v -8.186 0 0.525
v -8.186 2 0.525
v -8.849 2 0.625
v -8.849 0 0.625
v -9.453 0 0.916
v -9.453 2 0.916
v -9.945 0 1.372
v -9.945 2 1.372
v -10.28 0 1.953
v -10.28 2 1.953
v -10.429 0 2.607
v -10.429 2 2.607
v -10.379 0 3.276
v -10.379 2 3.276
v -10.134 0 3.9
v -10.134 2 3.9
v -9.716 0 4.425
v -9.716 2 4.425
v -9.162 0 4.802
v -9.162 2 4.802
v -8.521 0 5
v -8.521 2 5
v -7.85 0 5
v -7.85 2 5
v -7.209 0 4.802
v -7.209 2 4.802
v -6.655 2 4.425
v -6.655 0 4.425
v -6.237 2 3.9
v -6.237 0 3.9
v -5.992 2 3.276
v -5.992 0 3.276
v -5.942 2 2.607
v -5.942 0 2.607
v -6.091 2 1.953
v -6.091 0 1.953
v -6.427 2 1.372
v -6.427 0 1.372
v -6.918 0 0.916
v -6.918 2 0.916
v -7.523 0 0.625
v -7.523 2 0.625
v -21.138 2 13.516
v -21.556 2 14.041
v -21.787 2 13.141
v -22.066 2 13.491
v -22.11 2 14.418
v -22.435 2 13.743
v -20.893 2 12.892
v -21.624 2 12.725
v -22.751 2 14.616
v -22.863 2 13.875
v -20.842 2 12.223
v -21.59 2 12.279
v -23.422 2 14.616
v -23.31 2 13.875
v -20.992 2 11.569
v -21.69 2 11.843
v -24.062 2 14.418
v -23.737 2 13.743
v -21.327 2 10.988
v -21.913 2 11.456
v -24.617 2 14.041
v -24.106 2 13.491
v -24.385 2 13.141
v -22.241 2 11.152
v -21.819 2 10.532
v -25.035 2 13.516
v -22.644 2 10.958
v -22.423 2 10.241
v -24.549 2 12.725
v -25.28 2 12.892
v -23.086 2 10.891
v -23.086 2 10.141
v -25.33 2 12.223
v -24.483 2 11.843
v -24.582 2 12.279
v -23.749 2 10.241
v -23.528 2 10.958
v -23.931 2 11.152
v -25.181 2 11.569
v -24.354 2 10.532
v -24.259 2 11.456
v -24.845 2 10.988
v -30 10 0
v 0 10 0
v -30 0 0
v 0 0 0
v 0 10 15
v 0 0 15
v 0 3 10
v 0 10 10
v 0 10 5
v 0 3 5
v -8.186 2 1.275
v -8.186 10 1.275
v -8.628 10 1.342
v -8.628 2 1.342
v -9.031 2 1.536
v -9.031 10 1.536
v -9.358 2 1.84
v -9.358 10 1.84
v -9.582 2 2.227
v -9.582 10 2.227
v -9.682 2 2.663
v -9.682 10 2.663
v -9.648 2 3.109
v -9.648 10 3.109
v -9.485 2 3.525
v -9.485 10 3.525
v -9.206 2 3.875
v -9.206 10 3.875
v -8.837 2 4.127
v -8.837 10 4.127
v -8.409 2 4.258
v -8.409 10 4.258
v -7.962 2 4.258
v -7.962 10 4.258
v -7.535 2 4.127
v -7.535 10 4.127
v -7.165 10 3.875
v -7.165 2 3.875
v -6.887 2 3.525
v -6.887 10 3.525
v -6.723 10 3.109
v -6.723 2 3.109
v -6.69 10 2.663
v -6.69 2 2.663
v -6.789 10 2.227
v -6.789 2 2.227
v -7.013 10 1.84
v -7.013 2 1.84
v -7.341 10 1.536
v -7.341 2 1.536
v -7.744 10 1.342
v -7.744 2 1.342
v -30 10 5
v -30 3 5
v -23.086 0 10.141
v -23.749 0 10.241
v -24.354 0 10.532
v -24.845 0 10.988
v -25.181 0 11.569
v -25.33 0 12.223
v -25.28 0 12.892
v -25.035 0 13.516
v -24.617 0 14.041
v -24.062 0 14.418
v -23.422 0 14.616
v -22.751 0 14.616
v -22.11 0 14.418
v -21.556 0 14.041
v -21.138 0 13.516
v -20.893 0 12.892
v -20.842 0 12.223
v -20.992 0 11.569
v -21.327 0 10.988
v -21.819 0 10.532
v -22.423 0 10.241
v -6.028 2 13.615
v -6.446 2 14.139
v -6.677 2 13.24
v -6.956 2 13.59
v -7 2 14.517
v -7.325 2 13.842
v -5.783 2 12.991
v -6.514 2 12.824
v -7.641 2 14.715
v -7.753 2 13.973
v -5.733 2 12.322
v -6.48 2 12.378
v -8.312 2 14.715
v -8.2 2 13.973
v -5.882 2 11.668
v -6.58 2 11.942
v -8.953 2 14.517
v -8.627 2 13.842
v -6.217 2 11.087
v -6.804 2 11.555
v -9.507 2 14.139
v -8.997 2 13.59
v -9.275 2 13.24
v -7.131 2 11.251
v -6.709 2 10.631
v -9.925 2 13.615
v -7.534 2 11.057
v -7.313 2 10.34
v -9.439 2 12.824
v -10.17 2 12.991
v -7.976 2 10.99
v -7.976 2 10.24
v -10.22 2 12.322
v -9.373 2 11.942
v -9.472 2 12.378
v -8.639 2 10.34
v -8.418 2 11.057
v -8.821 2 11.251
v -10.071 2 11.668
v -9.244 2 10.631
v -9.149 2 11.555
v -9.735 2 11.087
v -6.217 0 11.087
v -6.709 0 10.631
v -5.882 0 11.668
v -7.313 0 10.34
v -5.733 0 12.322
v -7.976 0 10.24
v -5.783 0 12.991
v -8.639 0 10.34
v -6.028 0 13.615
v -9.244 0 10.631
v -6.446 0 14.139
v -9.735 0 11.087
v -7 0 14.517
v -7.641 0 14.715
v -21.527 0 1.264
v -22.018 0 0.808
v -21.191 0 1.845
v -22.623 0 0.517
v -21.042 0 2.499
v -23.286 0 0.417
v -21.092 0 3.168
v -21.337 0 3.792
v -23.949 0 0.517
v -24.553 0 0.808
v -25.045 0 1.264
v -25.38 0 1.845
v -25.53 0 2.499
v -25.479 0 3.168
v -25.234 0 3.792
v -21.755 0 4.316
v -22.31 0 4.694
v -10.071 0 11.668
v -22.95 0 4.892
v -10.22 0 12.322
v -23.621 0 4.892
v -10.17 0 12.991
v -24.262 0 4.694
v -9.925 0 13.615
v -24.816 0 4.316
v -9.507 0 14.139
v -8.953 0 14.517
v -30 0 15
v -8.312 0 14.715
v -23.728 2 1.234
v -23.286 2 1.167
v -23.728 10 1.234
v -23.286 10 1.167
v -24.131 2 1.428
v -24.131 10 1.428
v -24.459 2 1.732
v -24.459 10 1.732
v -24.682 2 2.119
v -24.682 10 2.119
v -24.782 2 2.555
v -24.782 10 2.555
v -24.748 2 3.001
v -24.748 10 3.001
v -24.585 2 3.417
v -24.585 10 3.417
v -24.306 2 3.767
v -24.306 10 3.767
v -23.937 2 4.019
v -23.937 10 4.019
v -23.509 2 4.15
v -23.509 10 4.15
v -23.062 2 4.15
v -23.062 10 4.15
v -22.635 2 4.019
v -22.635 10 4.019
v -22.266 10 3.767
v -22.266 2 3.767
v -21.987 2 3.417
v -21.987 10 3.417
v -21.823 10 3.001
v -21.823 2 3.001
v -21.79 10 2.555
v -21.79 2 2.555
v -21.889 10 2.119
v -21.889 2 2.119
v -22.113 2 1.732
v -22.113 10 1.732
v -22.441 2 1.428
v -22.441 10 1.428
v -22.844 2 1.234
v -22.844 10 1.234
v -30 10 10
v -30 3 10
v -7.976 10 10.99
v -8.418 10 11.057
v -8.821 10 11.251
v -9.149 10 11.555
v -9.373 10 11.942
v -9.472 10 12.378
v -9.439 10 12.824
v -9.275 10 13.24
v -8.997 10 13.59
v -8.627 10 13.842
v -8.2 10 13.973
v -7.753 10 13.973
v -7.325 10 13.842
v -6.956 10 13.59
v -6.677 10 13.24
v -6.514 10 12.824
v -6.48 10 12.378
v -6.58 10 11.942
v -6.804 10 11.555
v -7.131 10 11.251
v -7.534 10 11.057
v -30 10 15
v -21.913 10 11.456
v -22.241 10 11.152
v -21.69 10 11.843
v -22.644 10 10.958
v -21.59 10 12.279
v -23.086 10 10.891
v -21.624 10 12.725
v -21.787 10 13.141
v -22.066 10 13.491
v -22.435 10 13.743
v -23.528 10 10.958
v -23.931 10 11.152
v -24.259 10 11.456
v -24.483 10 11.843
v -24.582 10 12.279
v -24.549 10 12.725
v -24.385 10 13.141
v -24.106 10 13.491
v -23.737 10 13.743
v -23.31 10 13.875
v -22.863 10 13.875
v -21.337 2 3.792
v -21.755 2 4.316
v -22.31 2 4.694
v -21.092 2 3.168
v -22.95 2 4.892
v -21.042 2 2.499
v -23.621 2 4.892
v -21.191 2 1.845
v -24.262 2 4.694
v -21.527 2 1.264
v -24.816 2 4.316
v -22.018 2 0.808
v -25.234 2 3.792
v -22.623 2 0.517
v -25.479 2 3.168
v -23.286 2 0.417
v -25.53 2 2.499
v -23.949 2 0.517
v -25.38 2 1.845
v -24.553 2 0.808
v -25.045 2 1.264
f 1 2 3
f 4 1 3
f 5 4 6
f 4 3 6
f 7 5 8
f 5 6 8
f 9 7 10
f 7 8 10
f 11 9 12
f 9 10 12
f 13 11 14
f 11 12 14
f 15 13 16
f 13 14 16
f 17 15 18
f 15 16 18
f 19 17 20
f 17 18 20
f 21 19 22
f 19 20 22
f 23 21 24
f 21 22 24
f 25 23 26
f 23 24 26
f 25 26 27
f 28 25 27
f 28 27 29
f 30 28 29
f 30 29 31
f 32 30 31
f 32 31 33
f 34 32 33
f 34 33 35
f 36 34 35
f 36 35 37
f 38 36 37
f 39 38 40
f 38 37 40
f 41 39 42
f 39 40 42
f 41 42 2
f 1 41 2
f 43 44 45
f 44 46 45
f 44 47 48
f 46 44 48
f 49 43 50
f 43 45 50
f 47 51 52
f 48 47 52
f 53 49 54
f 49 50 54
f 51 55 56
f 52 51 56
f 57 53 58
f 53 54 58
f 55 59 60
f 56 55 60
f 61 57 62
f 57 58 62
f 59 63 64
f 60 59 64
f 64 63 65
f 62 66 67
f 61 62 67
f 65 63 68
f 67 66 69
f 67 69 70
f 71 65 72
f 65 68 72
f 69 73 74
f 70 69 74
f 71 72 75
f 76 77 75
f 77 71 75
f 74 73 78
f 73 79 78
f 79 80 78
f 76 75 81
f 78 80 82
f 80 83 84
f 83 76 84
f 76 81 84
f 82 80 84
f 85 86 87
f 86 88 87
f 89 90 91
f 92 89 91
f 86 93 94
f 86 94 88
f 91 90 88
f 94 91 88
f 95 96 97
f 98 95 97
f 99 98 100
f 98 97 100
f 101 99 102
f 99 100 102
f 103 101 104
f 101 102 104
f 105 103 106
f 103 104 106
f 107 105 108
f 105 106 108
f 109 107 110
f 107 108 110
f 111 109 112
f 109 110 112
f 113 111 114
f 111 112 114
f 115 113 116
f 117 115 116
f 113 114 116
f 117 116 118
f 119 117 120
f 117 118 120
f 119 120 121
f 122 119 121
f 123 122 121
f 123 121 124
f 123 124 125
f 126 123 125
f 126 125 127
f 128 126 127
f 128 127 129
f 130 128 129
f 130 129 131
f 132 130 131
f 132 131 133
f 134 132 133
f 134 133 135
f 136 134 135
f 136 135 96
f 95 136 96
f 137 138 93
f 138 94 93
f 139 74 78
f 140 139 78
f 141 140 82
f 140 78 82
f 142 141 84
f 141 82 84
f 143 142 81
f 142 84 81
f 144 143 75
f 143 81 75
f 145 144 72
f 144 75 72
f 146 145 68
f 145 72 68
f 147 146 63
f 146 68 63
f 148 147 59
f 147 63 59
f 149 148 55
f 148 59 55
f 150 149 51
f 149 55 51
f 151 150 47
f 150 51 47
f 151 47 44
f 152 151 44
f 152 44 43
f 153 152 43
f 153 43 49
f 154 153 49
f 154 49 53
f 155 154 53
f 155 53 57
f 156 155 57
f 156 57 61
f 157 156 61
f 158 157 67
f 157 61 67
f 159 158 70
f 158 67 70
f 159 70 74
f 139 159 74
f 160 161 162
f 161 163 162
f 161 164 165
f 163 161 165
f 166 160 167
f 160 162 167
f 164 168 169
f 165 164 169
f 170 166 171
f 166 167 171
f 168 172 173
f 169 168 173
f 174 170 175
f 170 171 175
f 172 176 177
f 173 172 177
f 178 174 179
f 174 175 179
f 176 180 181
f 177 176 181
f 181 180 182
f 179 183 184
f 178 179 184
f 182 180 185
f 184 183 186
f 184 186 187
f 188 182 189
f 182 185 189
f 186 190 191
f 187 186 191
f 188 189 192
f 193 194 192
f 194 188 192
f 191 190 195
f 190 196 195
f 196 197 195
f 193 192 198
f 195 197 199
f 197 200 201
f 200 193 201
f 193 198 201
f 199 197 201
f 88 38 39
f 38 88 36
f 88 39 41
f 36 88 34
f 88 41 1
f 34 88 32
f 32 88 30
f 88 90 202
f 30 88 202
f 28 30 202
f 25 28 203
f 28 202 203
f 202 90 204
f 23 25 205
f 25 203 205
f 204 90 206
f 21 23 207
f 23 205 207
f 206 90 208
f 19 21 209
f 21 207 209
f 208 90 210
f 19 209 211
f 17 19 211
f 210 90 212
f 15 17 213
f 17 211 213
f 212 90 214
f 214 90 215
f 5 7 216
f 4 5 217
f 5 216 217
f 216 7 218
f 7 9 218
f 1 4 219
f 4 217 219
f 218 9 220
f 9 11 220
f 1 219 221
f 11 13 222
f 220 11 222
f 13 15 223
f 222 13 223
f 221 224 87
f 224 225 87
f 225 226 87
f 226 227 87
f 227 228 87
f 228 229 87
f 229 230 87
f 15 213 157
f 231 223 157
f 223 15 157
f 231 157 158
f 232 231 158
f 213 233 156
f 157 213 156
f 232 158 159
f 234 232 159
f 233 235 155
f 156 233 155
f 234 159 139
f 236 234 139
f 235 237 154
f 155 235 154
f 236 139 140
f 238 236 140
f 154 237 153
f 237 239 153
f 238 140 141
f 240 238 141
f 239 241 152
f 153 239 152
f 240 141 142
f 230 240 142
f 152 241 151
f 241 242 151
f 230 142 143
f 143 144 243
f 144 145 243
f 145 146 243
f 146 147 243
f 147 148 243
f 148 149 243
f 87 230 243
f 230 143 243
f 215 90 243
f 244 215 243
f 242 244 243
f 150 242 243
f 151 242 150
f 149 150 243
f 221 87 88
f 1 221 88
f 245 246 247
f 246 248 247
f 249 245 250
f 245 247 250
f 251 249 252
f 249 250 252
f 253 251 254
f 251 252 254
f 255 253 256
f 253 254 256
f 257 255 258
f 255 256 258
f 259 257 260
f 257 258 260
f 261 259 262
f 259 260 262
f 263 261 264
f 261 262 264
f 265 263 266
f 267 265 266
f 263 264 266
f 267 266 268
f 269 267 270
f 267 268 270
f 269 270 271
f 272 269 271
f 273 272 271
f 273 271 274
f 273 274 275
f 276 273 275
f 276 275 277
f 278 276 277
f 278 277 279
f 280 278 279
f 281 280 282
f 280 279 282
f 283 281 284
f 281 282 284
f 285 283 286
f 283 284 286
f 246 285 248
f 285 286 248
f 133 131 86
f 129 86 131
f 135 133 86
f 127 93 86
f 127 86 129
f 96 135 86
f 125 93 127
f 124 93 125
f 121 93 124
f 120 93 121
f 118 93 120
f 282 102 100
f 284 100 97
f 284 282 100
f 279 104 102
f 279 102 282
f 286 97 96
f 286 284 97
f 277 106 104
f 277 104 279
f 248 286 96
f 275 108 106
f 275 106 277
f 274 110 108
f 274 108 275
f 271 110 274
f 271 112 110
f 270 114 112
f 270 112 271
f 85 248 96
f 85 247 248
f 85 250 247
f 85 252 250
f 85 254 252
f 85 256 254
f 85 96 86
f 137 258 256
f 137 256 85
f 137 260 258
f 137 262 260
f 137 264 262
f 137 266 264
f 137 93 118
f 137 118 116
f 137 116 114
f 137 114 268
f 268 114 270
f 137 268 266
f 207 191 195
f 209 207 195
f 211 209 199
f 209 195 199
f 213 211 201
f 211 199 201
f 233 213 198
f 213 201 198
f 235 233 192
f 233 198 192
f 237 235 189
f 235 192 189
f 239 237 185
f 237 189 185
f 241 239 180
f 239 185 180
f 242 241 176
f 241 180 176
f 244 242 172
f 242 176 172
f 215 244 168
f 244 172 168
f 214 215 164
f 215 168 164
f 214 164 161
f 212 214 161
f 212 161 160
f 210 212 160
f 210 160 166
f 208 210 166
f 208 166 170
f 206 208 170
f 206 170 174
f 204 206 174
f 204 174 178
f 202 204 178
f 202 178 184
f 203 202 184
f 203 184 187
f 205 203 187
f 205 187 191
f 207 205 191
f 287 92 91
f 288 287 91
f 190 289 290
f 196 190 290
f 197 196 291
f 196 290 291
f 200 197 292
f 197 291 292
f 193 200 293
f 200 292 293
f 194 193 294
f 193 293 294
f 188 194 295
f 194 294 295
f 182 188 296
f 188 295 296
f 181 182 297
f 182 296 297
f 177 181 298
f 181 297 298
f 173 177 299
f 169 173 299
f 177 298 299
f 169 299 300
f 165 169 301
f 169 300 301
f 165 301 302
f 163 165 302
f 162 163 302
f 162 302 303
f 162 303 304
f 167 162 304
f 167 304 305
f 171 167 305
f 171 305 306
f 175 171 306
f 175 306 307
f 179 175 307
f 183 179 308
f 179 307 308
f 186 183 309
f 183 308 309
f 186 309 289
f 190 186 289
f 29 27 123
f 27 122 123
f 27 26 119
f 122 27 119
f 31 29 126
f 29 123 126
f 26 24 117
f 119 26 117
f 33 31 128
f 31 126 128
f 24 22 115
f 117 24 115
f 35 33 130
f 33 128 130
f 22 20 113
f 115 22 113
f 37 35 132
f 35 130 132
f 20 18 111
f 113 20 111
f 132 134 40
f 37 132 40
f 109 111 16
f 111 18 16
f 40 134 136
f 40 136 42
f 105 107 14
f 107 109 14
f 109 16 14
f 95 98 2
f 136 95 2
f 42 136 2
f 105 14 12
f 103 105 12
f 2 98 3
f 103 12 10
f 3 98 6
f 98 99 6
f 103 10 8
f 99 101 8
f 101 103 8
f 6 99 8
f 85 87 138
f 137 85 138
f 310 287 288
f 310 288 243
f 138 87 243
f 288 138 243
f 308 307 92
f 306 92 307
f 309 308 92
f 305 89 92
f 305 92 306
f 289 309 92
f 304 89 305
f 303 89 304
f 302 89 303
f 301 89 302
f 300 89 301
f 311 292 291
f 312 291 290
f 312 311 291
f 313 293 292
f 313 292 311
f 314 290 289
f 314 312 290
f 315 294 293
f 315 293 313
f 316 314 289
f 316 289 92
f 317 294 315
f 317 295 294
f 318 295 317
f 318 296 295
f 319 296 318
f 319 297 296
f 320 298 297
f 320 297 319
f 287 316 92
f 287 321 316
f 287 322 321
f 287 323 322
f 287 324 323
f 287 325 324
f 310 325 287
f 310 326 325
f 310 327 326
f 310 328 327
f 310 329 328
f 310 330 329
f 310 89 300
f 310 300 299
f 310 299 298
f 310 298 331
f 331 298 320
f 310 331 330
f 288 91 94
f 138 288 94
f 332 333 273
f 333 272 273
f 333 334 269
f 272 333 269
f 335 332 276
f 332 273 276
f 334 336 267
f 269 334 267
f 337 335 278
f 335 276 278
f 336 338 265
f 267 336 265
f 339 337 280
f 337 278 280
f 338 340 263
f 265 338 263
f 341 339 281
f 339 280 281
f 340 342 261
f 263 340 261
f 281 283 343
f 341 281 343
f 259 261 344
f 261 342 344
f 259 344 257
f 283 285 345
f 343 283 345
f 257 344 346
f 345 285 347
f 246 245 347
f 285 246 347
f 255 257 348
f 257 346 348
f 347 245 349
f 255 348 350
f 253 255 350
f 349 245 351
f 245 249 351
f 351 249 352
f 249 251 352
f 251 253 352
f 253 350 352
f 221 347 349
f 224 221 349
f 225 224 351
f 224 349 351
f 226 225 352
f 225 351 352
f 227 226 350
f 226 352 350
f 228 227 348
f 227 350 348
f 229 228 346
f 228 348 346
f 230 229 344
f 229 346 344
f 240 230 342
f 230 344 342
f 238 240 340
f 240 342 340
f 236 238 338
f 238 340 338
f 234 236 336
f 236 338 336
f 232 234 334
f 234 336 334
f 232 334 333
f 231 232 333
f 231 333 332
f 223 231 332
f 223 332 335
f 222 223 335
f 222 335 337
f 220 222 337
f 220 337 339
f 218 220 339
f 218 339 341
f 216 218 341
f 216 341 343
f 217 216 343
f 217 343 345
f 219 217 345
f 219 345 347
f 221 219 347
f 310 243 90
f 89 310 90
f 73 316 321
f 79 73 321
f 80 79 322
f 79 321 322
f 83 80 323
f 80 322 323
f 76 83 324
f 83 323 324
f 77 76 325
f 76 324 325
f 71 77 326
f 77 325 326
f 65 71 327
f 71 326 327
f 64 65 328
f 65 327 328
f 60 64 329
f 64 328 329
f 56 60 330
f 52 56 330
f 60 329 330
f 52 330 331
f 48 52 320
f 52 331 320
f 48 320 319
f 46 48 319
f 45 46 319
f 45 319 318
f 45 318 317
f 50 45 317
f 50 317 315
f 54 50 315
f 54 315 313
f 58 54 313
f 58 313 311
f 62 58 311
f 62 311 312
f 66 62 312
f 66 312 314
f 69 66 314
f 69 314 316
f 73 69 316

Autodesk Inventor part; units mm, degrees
ref_plane "YZ Plane" through (0, 0, 0) normal (1, 0, 0) x (0, 1, 0)
ref_plane "XZ Plane" through (0, 0, 0) normal (0, 1, 0) x (-1, 0, 0)
ref_plane "XY Plane" through (0, 0, 0) normal (0, 0, 1) x (1, 0, 0)
sketch "スケッチ1" plane through (0, 0, 0) normal (0, 1, 0) x (-1, 0, 0)
  line L0 (0, 0) -> (30, 0)
  line L1 (30, 0) -> (30, 15)
  line L2 (30, 15) -> (0, 15)
  line L3 (0, 15) -> (0, 0)
  dimension "d0" = 30
  dimension "d1" = 15
extrude "押し出し1" add sketch "スケッチ1" along normal blind 10
sketch "スケッチ2" plane through (0, 0, 0) normal (1, 0, 0) x (0, 1, 0)
  line L0 (3, 5) -> (10, 5)
  line L1 (10, 5) -> (10, 10)
  line L2 (10, 10) -> (3, 10)
  line L3 (3, 10) -> (3, 5)
  point P0 (0, 0)
  dimension "d4" = 7
  dimension "d5" = 5
  dimension "d6" = 10
  dimension "d7" = 10
extrude "押し出し2" cut sketch "スケッチ2" against normal blind 30
hole "穴1" at (-23.0862, 0, 12.3913) direction (0, 1, 0) diameter 3 depth 10 tip angle 118 counterbore diameter 4.5 counterbore depth 2
hole "穴2" at (-7.9763, 0, 12.4901) direction (0, 1, 0) diameter 3 depth 10 tip angle 118 counterbore diameter 4.5 counterbore depth 2
hole "穴3" at (-23.2858, 0, 2.6671) direction (0, 1, 0) diameter 3 depth 10 tip angle 118 counterbore diameter 4.5 counterbore depth 2
hole "穴4" at (-8.1857, 0, 2.7752) direction (0, 1, 0) diameter 3 depth 10 tip angle 118 counterbore diameter 4.5 counterbore depth 2
properties part number "braket1"
